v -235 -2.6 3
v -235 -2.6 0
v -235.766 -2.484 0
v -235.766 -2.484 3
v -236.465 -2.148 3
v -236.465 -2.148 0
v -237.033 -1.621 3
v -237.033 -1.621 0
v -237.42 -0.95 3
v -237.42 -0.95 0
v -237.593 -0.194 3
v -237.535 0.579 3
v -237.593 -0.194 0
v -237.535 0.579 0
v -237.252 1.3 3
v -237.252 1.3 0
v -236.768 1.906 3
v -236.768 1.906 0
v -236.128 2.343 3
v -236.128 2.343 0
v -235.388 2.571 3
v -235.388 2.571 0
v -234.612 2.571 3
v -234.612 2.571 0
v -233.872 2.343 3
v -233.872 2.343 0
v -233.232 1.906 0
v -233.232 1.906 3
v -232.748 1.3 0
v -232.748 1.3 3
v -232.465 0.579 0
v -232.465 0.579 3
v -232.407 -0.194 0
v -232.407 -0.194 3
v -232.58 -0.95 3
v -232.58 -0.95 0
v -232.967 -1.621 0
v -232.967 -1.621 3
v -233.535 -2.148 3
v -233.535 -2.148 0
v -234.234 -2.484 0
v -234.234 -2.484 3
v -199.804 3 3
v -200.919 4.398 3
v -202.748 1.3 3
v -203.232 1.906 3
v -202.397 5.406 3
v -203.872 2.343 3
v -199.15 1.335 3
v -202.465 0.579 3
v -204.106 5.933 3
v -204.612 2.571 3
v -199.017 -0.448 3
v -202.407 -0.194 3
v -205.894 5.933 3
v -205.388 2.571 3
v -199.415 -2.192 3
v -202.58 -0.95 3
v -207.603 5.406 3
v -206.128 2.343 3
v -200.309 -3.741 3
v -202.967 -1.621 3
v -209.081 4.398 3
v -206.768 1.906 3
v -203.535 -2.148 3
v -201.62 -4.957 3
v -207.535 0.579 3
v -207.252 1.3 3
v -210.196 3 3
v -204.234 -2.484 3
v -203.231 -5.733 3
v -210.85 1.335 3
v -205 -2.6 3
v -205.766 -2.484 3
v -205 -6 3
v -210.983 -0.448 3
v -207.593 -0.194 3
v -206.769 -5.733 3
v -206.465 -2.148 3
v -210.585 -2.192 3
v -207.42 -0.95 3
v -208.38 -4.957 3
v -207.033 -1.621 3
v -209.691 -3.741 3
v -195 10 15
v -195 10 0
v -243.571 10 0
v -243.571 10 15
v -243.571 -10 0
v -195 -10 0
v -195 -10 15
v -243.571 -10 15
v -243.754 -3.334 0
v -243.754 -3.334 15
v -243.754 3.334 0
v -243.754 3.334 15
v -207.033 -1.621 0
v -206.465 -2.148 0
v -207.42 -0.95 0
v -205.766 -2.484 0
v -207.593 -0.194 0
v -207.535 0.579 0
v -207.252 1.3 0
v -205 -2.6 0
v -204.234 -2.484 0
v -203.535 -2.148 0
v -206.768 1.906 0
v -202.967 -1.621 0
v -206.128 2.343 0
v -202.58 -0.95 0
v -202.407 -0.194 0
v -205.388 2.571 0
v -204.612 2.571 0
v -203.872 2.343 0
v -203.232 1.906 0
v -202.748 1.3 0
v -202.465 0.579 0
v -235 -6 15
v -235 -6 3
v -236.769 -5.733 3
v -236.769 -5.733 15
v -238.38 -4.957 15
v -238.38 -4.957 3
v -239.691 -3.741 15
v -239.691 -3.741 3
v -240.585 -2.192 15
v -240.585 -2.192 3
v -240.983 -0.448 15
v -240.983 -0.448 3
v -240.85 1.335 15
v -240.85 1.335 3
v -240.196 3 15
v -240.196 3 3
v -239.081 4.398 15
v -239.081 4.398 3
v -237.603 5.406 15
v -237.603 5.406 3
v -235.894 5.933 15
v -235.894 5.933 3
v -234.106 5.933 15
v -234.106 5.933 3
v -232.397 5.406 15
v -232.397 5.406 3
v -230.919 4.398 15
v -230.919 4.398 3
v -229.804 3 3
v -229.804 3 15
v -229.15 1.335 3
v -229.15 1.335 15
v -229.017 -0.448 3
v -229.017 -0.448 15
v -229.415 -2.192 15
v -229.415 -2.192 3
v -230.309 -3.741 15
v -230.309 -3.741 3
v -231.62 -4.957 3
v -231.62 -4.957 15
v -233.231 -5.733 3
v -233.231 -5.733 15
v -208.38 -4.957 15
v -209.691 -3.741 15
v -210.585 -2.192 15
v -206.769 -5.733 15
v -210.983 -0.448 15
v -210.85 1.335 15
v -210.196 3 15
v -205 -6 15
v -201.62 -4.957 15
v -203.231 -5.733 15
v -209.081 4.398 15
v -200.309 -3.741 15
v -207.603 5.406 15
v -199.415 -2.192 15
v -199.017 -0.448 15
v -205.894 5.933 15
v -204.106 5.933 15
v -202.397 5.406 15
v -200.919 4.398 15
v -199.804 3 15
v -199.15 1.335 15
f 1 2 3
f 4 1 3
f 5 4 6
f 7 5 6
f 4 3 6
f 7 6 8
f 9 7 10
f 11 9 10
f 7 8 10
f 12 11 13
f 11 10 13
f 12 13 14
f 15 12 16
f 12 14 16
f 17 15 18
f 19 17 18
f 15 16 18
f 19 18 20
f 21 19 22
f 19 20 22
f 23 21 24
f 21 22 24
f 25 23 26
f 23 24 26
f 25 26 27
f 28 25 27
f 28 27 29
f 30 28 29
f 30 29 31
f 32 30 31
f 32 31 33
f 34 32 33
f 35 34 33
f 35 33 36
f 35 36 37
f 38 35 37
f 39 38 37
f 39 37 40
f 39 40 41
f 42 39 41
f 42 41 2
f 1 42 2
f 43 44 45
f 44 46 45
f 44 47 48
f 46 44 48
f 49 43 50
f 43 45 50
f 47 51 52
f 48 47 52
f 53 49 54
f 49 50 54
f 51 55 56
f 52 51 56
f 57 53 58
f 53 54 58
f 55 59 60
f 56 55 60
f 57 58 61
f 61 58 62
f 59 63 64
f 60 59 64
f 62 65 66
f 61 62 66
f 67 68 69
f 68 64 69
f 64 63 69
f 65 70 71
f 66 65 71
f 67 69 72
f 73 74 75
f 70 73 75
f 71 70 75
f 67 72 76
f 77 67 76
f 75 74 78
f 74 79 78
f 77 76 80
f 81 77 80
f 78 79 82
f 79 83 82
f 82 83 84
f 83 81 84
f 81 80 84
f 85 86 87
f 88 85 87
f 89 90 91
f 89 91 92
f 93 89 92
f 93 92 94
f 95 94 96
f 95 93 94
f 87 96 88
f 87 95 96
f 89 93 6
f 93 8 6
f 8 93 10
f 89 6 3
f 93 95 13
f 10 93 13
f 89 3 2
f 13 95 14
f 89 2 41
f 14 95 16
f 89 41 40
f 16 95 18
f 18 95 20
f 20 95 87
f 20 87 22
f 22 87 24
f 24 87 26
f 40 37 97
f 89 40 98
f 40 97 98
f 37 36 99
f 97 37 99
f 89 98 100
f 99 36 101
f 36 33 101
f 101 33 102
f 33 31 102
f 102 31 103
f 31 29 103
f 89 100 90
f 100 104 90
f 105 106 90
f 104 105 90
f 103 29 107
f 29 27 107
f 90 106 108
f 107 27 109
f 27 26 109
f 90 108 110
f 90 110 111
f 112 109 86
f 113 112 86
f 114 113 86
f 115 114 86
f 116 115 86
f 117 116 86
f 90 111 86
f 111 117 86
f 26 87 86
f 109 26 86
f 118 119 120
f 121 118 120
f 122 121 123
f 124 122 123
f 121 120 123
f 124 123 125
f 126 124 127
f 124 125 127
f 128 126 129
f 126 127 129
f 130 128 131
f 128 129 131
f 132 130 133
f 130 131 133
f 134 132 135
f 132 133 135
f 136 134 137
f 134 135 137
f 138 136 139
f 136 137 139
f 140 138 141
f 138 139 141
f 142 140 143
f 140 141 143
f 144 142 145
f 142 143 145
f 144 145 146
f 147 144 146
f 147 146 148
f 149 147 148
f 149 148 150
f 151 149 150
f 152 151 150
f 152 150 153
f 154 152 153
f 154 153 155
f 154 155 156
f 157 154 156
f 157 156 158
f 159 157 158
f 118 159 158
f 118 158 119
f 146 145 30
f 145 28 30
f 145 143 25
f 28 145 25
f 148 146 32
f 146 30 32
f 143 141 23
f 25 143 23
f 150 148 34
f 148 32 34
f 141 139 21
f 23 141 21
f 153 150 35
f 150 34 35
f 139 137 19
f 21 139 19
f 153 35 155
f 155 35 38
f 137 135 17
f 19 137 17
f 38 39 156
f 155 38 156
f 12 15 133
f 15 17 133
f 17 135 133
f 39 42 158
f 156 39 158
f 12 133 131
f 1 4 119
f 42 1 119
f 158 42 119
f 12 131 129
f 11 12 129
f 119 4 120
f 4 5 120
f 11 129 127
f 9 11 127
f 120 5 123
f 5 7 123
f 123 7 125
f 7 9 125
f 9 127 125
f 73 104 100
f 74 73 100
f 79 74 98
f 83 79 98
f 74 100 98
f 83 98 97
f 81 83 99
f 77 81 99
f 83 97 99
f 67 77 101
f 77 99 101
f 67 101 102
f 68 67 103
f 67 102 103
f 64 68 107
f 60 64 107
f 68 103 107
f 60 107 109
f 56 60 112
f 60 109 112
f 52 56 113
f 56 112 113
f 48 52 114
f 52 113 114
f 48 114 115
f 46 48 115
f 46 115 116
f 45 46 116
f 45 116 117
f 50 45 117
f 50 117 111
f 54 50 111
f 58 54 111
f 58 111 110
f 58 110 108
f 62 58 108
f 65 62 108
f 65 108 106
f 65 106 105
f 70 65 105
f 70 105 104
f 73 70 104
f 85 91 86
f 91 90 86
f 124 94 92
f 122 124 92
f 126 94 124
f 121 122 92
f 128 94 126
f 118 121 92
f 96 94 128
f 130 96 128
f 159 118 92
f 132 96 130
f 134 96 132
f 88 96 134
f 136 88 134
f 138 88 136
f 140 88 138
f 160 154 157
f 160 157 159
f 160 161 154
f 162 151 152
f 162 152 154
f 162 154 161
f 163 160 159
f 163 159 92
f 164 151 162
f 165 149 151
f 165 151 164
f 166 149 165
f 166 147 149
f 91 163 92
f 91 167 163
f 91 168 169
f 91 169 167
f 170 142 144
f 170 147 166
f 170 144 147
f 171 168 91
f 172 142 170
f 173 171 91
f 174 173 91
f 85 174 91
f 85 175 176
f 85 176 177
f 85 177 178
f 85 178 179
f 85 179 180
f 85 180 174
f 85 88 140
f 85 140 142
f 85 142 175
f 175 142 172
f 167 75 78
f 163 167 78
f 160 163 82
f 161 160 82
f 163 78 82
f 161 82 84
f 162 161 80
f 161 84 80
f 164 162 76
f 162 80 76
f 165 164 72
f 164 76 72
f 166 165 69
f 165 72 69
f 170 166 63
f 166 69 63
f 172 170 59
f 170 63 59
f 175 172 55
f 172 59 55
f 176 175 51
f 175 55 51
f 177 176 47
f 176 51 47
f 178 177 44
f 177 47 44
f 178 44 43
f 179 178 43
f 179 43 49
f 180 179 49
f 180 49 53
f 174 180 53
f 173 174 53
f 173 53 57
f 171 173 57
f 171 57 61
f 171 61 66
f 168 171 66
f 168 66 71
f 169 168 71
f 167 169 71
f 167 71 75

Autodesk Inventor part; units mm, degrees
ref_plane "YZ Plane" through (0, 0, 0) normal (1, 0, 0) x (0, 1, 0)
ref_plane "XZ Plane" through (0, 0, 0) normal (0, 1, 0) x (-1, 0, 0)
ref_plane "XY Plane" through (0, 0, 0) normal (0, 0, 1) x (1, 0, 0)
sketch "Sketch1" plane through (0, 0, 0) normal (0, 0, 1) x (1, 0, 0)
  arc A0 (-243.5713, 10) -> (-243.5713, -10) centre (0, 0) ccw
  line L0 (-195, -10) -> (-195, 10)
  line L1 (-195, 10) -> (-243.5713, 10)
  line L2 (-195, -10) -> (-195, -10)
  line L3 (-195, -10) -> (-243.5713, -10)
  dimension "d19" = 10
  dimension "d20" = 10
  dimension "d21" = 0
extrude "Extrusion1" add sketch "Sketch1" along normal blind 15
sketch "Sketch2" plane through (0, 0, 15) normal (0, 0, 1) x (1, 0, 0)
  circle A0 centre (-205, 0) radius 2.6
  line L0 (-195, -10) -> (-195, 10) projected
  circle A1 centre (-235, 0) radius 2.6
  point P0 (0, 0)
  dimension "d6" = 5.2
  dimension "d7" = 10
  dimension "d8" = 10
  dimension "d9" = 5.2
  dimension "d10" = 10
  dimension "d11" = 30
hole "Hole1" at (-235, 0, 15) at (-205, 0, 15) direction (0, 0, -1) diameter 5.2 end through all counterbore diameter 12 counterbore depth 12
properties part number "turntable_hit"
